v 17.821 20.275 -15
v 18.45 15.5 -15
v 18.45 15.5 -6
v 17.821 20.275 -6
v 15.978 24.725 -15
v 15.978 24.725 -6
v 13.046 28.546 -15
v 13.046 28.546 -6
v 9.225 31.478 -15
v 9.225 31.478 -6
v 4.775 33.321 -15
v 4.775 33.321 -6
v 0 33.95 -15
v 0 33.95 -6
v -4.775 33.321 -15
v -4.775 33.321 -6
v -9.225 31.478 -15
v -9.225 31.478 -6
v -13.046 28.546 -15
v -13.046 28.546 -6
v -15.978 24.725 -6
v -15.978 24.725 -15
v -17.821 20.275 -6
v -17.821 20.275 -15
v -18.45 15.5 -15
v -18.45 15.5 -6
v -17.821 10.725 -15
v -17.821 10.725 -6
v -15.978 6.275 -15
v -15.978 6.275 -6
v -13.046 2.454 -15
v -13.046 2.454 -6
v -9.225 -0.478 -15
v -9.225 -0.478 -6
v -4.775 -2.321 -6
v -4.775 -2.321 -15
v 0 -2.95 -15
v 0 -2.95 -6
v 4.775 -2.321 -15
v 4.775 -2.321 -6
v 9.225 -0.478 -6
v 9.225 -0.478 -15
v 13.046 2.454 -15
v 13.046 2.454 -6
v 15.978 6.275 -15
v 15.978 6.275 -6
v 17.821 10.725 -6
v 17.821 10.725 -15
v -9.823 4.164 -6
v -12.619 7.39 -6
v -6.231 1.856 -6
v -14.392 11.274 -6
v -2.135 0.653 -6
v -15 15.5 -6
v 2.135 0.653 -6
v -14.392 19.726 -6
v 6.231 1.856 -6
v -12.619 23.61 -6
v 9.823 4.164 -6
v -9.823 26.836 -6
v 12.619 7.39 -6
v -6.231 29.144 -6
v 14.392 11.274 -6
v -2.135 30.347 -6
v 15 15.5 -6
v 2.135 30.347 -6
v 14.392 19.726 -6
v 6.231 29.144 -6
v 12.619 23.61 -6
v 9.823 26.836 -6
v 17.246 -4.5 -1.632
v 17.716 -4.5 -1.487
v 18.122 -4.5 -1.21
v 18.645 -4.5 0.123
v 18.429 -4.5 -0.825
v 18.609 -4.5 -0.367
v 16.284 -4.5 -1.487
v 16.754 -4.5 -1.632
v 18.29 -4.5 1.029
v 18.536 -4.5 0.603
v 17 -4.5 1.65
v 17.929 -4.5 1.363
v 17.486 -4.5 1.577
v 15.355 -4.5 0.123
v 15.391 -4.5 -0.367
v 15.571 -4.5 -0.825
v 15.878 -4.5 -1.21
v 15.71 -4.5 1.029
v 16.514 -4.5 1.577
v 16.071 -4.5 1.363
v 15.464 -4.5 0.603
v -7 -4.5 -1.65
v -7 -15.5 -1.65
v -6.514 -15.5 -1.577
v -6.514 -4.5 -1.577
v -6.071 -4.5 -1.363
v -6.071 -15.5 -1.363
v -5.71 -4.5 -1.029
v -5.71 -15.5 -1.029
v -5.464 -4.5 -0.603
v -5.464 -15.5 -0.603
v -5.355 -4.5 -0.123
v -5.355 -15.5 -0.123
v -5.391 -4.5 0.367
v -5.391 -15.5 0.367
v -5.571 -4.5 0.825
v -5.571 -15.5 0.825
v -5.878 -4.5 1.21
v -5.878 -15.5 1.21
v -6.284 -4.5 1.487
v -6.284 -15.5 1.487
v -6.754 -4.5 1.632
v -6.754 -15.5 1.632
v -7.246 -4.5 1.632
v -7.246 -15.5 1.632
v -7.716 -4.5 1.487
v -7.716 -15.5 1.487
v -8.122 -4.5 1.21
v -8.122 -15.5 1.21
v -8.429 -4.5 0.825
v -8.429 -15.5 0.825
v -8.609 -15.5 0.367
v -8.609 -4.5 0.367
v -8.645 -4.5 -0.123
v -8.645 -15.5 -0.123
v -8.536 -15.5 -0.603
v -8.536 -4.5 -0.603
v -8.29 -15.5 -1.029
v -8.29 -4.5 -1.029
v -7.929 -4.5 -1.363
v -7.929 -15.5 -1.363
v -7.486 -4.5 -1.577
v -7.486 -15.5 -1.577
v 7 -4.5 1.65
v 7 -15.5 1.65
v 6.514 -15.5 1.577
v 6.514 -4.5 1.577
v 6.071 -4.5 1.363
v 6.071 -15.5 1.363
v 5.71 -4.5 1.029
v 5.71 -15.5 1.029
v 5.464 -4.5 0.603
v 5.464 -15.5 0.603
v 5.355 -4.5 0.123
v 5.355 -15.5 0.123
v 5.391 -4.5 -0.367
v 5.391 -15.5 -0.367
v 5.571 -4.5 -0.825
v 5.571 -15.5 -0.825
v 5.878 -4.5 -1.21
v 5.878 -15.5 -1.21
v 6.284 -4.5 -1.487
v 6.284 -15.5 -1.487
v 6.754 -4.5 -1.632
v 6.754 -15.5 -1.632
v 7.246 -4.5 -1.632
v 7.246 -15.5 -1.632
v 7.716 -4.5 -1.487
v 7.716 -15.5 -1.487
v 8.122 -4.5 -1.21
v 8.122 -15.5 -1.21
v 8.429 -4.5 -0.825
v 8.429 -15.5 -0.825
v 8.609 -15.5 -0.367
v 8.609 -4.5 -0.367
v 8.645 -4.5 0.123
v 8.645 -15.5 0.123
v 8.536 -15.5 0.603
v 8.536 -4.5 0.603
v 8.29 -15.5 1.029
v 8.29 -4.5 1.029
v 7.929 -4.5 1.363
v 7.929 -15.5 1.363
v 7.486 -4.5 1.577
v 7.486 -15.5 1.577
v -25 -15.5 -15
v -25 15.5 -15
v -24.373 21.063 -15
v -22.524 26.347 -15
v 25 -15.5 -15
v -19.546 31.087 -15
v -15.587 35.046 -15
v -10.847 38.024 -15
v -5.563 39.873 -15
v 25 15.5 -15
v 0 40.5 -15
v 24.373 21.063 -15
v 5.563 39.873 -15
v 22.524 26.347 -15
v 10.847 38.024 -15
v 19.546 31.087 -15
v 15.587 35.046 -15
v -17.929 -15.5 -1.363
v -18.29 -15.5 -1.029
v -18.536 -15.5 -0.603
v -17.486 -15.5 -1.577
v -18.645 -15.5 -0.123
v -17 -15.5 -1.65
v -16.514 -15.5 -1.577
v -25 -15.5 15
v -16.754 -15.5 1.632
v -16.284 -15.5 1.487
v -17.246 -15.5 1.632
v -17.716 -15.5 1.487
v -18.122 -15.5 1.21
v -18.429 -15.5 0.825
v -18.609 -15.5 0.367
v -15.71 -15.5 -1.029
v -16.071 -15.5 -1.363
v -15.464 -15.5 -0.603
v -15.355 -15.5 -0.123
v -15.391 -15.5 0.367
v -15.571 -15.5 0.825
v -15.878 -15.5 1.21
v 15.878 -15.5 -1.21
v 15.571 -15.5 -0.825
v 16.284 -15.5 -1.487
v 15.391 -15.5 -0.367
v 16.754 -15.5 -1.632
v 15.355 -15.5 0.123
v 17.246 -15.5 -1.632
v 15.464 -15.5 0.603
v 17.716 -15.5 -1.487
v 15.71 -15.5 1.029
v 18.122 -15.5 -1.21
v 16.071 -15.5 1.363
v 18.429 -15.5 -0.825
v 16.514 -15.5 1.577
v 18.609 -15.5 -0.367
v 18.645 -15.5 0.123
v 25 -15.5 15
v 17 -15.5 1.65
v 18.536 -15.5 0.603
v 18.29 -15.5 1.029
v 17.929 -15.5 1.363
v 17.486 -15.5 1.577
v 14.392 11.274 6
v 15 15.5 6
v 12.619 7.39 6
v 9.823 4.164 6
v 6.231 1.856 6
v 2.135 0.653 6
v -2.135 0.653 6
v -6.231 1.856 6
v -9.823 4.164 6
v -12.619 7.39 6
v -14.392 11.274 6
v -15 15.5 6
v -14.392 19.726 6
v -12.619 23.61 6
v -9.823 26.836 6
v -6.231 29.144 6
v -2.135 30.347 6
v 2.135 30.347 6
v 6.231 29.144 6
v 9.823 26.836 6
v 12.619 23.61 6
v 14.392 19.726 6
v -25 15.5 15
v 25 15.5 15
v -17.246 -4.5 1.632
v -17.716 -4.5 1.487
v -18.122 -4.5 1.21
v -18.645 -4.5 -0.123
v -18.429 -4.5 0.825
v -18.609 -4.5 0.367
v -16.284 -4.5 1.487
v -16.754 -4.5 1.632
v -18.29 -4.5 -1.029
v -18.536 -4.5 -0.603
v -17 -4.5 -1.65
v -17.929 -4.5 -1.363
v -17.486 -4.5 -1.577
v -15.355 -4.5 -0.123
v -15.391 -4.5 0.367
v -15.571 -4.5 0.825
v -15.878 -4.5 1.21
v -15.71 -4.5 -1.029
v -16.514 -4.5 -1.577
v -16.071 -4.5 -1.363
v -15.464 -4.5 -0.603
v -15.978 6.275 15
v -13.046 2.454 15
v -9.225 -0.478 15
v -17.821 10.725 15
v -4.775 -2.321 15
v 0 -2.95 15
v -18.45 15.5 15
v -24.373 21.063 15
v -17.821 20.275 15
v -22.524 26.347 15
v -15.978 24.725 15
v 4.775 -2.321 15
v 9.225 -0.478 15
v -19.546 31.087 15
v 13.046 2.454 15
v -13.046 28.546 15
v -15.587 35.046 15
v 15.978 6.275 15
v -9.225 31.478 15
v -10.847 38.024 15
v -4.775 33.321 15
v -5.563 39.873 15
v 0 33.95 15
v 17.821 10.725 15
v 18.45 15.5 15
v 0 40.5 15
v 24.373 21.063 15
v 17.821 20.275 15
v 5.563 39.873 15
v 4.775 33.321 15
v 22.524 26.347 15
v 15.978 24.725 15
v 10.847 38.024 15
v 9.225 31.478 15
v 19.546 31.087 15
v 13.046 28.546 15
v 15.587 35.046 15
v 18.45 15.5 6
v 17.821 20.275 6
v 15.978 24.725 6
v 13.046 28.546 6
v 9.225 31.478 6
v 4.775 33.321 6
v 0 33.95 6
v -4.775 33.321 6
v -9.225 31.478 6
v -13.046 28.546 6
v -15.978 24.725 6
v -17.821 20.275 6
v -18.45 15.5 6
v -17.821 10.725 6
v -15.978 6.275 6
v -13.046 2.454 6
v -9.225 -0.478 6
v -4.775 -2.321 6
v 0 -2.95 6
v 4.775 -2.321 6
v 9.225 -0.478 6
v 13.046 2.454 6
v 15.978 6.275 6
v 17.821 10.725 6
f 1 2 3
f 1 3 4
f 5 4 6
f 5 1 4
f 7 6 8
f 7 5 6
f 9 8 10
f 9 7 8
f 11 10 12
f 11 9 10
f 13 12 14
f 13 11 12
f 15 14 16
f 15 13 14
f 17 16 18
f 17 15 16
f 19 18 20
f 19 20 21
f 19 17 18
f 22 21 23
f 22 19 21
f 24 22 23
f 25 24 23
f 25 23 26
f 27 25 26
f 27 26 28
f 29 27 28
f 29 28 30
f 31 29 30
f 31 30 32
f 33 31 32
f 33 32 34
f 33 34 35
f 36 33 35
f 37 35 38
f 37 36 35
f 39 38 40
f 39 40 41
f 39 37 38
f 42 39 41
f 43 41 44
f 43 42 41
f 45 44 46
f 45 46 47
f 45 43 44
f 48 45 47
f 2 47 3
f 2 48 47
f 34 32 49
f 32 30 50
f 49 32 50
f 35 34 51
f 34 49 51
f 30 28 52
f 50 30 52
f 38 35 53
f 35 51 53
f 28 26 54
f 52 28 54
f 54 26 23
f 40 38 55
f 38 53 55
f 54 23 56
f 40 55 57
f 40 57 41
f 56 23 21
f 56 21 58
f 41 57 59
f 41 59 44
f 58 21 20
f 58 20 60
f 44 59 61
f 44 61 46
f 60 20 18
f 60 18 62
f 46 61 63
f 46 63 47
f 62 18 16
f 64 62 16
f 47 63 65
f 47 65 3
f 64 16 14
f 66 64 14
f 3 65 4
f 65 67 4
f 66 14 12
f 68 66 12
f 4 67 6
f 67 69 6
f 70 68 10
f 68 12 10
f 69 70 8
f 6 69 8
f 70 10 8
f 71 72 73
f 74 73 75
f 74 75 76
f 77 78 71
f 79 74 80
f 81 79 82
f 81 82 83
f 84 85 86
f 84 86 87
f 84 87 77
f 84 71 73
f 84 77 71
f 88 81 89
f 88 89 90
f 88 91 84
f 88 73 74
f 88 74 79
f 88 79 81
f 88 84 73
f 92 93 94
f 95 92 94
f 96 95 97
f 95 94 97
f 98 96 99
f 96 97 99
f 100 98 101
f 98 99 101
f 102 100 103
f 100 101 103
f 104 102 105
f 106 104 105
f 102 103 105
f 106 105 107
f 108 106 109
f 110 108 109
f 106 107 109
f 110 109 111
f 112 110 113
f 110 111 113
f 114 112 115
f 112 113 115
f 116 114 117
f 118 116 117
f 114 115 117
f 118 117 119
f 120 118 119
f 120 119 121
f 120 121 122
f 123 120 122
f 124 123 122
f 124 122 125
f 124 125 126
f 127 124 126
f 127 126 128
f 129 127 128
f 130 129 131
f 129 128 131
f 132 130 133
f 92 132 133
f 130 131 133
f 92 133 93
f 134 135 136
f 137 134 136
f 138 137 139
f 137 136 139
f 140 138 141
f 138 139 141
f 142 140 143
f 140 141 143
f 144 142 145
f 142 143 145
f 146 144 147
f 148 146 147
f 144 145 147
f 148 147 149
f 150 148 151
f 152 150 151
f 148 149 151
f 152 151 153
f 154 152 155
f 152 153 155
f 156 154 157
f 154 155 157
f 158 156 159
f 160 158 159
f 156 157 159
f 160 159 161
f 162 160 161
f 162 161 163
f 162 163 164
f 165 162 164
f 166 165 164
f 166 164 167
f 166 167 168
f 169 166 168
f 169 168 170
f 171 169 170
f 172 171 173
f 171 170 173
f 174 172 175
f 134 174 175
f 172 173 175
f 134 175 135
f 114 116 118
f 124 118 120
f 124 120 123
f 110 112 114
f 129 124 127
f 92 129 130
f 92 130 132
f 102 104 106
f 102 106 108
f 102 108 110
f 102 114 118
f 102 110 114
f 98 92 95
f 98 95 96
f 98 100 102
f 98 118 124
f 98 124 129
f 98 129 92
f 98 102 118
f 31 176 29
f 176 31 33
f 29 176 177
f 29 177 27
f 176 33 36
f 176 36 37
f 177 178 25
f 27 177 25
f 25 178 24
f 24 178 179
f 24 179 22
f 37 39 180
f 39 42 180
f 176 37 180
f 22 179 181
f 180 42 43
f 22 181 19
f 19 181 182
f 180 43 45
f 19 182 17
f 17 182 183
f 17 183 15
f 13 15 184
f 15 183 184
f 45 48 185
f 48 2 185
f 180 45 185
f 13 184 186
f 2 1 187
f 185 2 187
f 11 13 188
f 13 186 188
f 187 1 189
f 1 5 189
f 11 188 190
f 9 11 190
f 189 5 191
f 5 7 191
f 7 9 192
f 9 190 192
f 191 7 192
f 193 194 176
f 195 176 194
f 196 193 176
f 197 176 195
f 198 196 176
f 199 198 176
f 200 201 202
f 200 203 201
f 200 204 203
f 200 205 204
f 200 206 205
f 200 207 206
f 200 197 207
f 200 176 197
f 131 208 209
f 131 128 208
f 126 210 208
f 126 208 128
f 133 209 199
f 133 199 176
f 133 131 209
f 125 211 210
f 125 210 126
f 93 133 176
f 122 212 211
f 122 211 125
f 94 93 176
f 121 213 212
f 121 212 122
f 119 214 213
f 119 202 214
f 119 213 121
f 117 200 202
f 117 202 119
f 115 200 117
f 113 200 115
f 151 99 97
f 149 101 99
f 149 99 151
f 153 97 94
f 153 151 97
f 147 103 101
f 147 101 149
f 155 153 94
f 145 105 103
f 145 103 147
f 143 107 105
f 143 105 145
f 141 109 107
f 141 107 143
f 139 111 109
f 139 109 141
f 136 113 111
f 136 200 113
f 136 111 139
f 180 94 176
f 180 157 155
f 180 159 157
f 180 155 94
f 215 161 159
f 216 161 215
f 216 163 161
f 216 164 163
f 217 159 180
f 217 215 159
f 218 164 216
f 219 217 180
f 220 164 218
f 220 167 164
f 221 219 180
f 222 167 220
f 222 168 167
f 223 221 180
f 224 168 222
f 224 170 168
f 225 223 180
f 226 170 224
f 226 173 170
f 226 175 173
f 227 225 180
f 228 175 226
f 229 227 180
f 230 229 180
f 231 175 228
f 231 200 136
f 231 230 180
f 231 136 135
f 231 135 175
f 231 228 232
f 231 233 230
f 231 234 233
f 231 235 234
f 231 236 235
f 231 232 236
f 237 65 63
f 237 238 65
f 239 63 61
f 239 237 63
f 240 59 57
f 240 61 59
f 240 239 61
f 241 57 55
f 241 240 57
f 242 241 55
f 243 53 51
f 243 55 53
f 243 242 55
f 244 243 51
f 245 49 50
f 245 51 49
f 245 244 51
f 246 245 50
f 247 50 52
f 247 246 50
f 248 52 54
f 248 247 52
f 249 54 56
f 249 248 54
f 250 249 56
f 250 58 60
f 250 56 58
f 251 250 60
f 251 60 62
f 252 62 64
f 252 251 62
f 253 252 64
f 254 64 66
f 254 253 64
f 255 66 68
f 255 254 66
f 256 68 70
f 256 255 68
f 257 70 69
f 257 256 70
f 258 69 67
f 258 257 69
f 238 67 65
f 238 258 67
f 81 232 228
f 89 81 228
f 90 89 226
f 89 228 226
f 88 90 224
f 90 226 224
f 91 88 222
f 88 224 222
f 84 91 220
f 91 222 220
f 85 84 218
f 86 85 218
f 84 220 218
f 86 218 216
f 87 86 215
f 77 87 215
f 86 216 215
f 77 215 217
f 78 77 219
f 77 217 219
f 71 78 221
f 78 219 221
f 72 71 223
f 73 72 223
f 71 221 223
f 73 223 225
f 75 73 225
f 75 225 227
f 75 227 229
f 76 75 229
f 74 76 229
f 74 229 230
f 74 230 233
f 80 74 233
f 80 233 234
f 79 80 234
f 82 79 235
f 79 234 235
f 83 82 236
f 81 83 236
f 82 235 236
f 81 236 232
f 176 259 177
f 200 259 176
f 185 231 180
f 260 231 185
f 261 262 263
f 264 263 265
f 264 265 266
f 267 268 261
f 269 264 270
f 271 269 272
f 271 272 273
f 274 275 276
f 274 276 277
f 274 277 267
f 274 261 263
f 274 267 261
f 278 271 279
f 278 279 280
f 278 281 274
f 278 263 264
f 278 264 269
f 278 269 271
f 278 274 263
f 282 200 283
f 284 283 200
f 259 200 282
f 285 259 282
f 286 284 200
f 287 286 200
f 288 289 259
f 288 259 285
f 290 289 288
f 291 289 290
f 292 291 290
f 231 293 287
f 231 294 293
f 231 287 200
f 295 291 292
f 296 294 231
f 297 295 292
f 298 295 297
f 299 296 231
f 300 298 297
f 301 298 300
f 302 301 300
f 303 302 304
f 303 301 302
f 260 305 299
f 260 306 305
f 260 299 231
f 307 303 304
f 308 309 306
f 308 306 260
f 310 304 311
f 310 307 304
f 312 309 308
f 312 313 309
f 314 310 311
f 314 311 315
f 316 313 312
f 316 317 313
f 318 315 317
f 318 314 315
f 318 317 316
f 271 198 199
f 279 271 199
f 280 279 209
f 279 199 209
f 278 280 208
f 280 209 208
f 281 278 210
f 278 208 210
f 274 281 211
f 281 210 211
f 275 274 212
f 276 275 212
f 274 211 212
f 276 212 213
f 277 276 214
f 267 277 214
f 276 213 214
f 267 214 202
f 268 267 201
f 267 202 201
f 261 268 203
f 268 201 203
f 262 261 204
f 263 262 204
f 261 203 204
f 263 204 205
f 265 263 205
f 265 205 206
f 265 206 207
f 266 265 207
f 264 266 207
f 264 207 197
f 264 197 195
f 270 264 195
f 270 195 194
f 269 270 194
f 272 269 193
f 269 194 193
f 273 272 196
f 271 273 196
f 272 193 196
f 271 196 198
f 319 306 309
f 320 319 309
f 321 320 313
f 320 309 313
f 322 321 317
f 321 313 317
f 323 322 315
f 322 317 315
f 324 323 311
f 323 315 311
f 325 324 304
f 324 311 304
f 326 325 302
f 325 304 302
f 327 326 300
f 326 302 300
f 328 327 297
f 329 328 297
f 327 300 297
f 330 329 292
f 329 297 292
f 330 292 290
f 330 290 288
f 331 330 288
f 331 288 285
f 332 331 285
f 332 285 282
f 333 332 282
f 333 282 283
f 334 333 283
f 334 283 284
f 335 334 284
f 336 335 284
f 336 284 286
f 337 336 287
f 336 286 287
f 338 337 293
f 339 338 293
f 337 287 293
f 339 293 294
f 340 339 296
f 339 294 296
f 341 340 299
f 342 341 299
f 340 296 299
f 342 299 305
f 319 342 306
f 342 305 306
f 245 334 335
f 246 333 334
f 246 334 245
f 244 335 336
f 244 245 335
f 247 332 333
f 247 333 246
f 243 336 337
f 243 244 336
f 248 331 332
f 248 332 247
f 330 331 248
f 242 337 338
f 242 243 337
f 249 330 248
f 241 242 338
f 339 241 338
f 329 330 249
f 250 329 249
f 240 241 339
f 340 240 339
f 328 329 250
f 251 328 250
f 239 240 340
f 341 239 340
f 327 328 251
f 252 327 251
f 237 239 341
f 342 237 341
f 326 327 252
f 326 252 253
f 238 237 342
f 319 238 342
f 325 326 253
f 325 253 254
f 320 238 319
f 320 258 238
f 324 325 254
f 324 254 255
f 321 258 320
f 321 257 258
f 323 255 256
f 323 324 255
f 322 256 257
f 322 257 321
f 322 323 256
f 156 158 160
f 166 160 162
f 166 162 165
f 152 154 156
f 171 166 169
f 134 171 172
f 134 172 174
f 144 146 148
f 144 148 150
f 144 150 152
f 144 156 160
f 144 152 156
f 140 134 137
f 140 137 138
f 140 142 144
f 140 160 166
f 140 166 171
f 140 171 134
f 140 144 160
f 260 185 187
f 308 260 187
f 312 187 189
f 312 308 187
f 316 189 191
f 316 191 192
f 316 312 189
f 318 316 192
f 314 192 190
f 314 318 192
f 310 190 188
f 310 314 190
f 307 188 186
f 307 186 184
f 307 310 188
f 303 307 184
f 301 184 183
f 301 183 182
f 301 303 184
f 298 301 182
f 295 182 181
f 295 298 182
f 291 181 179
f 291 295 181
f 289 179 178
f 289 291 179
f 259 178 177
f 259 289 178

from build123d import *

# Parameters (mm, degrees)
AUFSATZ_LINEAR_AUSTRAGEN1_DEPTH = 15
SKIZZE3_R                       = 18.45
SCHNITT_LINEAR_AUSTRAGEN1_DEPTH = 9
SKIZZE4_R                       = 1.65
SCHNITT_LINEAR_AUSTRAGEN2_DEPTH = 11


with BuildPart() as part:
    # Skizze1 → Aufsatz-Linear austragen1 (new, symmetric)
    with BuildSketch(Plane.XY):
        with BuildLine():
            ThreePointArc((25, 15.5), (0, 40.5), (-25, 15.5))
            Line((-25, 15.5), (-15, 15.5))
            ThreePointArc((-15, 15.5), (0, 30.5), (15, 15.5))
            Line((15, 15.5), (25, 15.5))
        make_face()
        with BuildLine():
            Line((-15, 15.5), (-25, 15.5))
            ThreePointArc((-25, 15.5), (0, -9.5), (25, 15.5))
            Line((25, 15.5), (15, 15.5))
            ThreePointArc((15, 15.5), (0, 0.5), (-15, 15.5))
        make_face()
        with BuildLine():
            Line((-25, 15.5), (-25, -15.5))
            Line((-25, -15.5), (25, -15.5))
            Line((25, -15.5), (25, 15.5))
            ThreePointArc((25, 15.5), (0, -9.5), (-25, 15.5))
        make_face()
    extrude(amount=AUFSATZ_LINEAR_AUSTRAGEN1_DEPTH, both=True)

    # Skizze3 → Schnitt-Linear austragen1 (cut)
    with BuildSketch(Plane.XY.offset(15)):
        with Locations((0, 15.5)):
            Circle(SKIZZE3_R)
    schnitt_linear_austragen1 = extrude(amount=-SCHNITT_LINEAR_AUSTRAGEN1_DEPTH, mode=Mode.SUBTRACT)

    # Spiegeln1: Schnitt-Linear austragen1 across plane
    add(schnitt_linear_austragen1.mirror(Plane.XY), mode=Mode.SUBTRACT)

    # Skizze4 → Schnitt-Linear austragen2 (cut)
    with BuildSketch(Plane.XZ.offset(15.5)):
        with Locations(Location((-17, 0, 0), (0, 0, 270))):
            Circle(SKIZZE4_R)
        with Locations(Location((-7, 0, 0), (0, 0, 270))):
            Circle(SKIZZE4_R)
        with Locations(Location((7, 0, 0), (0, 0, 90))):
            Circle(SKIZZE4_R)
        with Locations(Location((17, 0, 0), (0, 0, 90))):
            Circle(SKIZZE4_R)
    extrude(amount=-SCHNITT_LINEAR_AUSTRAGEN2_DEPTH, mode=Mode.SUBTRACT)


solid = part.part
